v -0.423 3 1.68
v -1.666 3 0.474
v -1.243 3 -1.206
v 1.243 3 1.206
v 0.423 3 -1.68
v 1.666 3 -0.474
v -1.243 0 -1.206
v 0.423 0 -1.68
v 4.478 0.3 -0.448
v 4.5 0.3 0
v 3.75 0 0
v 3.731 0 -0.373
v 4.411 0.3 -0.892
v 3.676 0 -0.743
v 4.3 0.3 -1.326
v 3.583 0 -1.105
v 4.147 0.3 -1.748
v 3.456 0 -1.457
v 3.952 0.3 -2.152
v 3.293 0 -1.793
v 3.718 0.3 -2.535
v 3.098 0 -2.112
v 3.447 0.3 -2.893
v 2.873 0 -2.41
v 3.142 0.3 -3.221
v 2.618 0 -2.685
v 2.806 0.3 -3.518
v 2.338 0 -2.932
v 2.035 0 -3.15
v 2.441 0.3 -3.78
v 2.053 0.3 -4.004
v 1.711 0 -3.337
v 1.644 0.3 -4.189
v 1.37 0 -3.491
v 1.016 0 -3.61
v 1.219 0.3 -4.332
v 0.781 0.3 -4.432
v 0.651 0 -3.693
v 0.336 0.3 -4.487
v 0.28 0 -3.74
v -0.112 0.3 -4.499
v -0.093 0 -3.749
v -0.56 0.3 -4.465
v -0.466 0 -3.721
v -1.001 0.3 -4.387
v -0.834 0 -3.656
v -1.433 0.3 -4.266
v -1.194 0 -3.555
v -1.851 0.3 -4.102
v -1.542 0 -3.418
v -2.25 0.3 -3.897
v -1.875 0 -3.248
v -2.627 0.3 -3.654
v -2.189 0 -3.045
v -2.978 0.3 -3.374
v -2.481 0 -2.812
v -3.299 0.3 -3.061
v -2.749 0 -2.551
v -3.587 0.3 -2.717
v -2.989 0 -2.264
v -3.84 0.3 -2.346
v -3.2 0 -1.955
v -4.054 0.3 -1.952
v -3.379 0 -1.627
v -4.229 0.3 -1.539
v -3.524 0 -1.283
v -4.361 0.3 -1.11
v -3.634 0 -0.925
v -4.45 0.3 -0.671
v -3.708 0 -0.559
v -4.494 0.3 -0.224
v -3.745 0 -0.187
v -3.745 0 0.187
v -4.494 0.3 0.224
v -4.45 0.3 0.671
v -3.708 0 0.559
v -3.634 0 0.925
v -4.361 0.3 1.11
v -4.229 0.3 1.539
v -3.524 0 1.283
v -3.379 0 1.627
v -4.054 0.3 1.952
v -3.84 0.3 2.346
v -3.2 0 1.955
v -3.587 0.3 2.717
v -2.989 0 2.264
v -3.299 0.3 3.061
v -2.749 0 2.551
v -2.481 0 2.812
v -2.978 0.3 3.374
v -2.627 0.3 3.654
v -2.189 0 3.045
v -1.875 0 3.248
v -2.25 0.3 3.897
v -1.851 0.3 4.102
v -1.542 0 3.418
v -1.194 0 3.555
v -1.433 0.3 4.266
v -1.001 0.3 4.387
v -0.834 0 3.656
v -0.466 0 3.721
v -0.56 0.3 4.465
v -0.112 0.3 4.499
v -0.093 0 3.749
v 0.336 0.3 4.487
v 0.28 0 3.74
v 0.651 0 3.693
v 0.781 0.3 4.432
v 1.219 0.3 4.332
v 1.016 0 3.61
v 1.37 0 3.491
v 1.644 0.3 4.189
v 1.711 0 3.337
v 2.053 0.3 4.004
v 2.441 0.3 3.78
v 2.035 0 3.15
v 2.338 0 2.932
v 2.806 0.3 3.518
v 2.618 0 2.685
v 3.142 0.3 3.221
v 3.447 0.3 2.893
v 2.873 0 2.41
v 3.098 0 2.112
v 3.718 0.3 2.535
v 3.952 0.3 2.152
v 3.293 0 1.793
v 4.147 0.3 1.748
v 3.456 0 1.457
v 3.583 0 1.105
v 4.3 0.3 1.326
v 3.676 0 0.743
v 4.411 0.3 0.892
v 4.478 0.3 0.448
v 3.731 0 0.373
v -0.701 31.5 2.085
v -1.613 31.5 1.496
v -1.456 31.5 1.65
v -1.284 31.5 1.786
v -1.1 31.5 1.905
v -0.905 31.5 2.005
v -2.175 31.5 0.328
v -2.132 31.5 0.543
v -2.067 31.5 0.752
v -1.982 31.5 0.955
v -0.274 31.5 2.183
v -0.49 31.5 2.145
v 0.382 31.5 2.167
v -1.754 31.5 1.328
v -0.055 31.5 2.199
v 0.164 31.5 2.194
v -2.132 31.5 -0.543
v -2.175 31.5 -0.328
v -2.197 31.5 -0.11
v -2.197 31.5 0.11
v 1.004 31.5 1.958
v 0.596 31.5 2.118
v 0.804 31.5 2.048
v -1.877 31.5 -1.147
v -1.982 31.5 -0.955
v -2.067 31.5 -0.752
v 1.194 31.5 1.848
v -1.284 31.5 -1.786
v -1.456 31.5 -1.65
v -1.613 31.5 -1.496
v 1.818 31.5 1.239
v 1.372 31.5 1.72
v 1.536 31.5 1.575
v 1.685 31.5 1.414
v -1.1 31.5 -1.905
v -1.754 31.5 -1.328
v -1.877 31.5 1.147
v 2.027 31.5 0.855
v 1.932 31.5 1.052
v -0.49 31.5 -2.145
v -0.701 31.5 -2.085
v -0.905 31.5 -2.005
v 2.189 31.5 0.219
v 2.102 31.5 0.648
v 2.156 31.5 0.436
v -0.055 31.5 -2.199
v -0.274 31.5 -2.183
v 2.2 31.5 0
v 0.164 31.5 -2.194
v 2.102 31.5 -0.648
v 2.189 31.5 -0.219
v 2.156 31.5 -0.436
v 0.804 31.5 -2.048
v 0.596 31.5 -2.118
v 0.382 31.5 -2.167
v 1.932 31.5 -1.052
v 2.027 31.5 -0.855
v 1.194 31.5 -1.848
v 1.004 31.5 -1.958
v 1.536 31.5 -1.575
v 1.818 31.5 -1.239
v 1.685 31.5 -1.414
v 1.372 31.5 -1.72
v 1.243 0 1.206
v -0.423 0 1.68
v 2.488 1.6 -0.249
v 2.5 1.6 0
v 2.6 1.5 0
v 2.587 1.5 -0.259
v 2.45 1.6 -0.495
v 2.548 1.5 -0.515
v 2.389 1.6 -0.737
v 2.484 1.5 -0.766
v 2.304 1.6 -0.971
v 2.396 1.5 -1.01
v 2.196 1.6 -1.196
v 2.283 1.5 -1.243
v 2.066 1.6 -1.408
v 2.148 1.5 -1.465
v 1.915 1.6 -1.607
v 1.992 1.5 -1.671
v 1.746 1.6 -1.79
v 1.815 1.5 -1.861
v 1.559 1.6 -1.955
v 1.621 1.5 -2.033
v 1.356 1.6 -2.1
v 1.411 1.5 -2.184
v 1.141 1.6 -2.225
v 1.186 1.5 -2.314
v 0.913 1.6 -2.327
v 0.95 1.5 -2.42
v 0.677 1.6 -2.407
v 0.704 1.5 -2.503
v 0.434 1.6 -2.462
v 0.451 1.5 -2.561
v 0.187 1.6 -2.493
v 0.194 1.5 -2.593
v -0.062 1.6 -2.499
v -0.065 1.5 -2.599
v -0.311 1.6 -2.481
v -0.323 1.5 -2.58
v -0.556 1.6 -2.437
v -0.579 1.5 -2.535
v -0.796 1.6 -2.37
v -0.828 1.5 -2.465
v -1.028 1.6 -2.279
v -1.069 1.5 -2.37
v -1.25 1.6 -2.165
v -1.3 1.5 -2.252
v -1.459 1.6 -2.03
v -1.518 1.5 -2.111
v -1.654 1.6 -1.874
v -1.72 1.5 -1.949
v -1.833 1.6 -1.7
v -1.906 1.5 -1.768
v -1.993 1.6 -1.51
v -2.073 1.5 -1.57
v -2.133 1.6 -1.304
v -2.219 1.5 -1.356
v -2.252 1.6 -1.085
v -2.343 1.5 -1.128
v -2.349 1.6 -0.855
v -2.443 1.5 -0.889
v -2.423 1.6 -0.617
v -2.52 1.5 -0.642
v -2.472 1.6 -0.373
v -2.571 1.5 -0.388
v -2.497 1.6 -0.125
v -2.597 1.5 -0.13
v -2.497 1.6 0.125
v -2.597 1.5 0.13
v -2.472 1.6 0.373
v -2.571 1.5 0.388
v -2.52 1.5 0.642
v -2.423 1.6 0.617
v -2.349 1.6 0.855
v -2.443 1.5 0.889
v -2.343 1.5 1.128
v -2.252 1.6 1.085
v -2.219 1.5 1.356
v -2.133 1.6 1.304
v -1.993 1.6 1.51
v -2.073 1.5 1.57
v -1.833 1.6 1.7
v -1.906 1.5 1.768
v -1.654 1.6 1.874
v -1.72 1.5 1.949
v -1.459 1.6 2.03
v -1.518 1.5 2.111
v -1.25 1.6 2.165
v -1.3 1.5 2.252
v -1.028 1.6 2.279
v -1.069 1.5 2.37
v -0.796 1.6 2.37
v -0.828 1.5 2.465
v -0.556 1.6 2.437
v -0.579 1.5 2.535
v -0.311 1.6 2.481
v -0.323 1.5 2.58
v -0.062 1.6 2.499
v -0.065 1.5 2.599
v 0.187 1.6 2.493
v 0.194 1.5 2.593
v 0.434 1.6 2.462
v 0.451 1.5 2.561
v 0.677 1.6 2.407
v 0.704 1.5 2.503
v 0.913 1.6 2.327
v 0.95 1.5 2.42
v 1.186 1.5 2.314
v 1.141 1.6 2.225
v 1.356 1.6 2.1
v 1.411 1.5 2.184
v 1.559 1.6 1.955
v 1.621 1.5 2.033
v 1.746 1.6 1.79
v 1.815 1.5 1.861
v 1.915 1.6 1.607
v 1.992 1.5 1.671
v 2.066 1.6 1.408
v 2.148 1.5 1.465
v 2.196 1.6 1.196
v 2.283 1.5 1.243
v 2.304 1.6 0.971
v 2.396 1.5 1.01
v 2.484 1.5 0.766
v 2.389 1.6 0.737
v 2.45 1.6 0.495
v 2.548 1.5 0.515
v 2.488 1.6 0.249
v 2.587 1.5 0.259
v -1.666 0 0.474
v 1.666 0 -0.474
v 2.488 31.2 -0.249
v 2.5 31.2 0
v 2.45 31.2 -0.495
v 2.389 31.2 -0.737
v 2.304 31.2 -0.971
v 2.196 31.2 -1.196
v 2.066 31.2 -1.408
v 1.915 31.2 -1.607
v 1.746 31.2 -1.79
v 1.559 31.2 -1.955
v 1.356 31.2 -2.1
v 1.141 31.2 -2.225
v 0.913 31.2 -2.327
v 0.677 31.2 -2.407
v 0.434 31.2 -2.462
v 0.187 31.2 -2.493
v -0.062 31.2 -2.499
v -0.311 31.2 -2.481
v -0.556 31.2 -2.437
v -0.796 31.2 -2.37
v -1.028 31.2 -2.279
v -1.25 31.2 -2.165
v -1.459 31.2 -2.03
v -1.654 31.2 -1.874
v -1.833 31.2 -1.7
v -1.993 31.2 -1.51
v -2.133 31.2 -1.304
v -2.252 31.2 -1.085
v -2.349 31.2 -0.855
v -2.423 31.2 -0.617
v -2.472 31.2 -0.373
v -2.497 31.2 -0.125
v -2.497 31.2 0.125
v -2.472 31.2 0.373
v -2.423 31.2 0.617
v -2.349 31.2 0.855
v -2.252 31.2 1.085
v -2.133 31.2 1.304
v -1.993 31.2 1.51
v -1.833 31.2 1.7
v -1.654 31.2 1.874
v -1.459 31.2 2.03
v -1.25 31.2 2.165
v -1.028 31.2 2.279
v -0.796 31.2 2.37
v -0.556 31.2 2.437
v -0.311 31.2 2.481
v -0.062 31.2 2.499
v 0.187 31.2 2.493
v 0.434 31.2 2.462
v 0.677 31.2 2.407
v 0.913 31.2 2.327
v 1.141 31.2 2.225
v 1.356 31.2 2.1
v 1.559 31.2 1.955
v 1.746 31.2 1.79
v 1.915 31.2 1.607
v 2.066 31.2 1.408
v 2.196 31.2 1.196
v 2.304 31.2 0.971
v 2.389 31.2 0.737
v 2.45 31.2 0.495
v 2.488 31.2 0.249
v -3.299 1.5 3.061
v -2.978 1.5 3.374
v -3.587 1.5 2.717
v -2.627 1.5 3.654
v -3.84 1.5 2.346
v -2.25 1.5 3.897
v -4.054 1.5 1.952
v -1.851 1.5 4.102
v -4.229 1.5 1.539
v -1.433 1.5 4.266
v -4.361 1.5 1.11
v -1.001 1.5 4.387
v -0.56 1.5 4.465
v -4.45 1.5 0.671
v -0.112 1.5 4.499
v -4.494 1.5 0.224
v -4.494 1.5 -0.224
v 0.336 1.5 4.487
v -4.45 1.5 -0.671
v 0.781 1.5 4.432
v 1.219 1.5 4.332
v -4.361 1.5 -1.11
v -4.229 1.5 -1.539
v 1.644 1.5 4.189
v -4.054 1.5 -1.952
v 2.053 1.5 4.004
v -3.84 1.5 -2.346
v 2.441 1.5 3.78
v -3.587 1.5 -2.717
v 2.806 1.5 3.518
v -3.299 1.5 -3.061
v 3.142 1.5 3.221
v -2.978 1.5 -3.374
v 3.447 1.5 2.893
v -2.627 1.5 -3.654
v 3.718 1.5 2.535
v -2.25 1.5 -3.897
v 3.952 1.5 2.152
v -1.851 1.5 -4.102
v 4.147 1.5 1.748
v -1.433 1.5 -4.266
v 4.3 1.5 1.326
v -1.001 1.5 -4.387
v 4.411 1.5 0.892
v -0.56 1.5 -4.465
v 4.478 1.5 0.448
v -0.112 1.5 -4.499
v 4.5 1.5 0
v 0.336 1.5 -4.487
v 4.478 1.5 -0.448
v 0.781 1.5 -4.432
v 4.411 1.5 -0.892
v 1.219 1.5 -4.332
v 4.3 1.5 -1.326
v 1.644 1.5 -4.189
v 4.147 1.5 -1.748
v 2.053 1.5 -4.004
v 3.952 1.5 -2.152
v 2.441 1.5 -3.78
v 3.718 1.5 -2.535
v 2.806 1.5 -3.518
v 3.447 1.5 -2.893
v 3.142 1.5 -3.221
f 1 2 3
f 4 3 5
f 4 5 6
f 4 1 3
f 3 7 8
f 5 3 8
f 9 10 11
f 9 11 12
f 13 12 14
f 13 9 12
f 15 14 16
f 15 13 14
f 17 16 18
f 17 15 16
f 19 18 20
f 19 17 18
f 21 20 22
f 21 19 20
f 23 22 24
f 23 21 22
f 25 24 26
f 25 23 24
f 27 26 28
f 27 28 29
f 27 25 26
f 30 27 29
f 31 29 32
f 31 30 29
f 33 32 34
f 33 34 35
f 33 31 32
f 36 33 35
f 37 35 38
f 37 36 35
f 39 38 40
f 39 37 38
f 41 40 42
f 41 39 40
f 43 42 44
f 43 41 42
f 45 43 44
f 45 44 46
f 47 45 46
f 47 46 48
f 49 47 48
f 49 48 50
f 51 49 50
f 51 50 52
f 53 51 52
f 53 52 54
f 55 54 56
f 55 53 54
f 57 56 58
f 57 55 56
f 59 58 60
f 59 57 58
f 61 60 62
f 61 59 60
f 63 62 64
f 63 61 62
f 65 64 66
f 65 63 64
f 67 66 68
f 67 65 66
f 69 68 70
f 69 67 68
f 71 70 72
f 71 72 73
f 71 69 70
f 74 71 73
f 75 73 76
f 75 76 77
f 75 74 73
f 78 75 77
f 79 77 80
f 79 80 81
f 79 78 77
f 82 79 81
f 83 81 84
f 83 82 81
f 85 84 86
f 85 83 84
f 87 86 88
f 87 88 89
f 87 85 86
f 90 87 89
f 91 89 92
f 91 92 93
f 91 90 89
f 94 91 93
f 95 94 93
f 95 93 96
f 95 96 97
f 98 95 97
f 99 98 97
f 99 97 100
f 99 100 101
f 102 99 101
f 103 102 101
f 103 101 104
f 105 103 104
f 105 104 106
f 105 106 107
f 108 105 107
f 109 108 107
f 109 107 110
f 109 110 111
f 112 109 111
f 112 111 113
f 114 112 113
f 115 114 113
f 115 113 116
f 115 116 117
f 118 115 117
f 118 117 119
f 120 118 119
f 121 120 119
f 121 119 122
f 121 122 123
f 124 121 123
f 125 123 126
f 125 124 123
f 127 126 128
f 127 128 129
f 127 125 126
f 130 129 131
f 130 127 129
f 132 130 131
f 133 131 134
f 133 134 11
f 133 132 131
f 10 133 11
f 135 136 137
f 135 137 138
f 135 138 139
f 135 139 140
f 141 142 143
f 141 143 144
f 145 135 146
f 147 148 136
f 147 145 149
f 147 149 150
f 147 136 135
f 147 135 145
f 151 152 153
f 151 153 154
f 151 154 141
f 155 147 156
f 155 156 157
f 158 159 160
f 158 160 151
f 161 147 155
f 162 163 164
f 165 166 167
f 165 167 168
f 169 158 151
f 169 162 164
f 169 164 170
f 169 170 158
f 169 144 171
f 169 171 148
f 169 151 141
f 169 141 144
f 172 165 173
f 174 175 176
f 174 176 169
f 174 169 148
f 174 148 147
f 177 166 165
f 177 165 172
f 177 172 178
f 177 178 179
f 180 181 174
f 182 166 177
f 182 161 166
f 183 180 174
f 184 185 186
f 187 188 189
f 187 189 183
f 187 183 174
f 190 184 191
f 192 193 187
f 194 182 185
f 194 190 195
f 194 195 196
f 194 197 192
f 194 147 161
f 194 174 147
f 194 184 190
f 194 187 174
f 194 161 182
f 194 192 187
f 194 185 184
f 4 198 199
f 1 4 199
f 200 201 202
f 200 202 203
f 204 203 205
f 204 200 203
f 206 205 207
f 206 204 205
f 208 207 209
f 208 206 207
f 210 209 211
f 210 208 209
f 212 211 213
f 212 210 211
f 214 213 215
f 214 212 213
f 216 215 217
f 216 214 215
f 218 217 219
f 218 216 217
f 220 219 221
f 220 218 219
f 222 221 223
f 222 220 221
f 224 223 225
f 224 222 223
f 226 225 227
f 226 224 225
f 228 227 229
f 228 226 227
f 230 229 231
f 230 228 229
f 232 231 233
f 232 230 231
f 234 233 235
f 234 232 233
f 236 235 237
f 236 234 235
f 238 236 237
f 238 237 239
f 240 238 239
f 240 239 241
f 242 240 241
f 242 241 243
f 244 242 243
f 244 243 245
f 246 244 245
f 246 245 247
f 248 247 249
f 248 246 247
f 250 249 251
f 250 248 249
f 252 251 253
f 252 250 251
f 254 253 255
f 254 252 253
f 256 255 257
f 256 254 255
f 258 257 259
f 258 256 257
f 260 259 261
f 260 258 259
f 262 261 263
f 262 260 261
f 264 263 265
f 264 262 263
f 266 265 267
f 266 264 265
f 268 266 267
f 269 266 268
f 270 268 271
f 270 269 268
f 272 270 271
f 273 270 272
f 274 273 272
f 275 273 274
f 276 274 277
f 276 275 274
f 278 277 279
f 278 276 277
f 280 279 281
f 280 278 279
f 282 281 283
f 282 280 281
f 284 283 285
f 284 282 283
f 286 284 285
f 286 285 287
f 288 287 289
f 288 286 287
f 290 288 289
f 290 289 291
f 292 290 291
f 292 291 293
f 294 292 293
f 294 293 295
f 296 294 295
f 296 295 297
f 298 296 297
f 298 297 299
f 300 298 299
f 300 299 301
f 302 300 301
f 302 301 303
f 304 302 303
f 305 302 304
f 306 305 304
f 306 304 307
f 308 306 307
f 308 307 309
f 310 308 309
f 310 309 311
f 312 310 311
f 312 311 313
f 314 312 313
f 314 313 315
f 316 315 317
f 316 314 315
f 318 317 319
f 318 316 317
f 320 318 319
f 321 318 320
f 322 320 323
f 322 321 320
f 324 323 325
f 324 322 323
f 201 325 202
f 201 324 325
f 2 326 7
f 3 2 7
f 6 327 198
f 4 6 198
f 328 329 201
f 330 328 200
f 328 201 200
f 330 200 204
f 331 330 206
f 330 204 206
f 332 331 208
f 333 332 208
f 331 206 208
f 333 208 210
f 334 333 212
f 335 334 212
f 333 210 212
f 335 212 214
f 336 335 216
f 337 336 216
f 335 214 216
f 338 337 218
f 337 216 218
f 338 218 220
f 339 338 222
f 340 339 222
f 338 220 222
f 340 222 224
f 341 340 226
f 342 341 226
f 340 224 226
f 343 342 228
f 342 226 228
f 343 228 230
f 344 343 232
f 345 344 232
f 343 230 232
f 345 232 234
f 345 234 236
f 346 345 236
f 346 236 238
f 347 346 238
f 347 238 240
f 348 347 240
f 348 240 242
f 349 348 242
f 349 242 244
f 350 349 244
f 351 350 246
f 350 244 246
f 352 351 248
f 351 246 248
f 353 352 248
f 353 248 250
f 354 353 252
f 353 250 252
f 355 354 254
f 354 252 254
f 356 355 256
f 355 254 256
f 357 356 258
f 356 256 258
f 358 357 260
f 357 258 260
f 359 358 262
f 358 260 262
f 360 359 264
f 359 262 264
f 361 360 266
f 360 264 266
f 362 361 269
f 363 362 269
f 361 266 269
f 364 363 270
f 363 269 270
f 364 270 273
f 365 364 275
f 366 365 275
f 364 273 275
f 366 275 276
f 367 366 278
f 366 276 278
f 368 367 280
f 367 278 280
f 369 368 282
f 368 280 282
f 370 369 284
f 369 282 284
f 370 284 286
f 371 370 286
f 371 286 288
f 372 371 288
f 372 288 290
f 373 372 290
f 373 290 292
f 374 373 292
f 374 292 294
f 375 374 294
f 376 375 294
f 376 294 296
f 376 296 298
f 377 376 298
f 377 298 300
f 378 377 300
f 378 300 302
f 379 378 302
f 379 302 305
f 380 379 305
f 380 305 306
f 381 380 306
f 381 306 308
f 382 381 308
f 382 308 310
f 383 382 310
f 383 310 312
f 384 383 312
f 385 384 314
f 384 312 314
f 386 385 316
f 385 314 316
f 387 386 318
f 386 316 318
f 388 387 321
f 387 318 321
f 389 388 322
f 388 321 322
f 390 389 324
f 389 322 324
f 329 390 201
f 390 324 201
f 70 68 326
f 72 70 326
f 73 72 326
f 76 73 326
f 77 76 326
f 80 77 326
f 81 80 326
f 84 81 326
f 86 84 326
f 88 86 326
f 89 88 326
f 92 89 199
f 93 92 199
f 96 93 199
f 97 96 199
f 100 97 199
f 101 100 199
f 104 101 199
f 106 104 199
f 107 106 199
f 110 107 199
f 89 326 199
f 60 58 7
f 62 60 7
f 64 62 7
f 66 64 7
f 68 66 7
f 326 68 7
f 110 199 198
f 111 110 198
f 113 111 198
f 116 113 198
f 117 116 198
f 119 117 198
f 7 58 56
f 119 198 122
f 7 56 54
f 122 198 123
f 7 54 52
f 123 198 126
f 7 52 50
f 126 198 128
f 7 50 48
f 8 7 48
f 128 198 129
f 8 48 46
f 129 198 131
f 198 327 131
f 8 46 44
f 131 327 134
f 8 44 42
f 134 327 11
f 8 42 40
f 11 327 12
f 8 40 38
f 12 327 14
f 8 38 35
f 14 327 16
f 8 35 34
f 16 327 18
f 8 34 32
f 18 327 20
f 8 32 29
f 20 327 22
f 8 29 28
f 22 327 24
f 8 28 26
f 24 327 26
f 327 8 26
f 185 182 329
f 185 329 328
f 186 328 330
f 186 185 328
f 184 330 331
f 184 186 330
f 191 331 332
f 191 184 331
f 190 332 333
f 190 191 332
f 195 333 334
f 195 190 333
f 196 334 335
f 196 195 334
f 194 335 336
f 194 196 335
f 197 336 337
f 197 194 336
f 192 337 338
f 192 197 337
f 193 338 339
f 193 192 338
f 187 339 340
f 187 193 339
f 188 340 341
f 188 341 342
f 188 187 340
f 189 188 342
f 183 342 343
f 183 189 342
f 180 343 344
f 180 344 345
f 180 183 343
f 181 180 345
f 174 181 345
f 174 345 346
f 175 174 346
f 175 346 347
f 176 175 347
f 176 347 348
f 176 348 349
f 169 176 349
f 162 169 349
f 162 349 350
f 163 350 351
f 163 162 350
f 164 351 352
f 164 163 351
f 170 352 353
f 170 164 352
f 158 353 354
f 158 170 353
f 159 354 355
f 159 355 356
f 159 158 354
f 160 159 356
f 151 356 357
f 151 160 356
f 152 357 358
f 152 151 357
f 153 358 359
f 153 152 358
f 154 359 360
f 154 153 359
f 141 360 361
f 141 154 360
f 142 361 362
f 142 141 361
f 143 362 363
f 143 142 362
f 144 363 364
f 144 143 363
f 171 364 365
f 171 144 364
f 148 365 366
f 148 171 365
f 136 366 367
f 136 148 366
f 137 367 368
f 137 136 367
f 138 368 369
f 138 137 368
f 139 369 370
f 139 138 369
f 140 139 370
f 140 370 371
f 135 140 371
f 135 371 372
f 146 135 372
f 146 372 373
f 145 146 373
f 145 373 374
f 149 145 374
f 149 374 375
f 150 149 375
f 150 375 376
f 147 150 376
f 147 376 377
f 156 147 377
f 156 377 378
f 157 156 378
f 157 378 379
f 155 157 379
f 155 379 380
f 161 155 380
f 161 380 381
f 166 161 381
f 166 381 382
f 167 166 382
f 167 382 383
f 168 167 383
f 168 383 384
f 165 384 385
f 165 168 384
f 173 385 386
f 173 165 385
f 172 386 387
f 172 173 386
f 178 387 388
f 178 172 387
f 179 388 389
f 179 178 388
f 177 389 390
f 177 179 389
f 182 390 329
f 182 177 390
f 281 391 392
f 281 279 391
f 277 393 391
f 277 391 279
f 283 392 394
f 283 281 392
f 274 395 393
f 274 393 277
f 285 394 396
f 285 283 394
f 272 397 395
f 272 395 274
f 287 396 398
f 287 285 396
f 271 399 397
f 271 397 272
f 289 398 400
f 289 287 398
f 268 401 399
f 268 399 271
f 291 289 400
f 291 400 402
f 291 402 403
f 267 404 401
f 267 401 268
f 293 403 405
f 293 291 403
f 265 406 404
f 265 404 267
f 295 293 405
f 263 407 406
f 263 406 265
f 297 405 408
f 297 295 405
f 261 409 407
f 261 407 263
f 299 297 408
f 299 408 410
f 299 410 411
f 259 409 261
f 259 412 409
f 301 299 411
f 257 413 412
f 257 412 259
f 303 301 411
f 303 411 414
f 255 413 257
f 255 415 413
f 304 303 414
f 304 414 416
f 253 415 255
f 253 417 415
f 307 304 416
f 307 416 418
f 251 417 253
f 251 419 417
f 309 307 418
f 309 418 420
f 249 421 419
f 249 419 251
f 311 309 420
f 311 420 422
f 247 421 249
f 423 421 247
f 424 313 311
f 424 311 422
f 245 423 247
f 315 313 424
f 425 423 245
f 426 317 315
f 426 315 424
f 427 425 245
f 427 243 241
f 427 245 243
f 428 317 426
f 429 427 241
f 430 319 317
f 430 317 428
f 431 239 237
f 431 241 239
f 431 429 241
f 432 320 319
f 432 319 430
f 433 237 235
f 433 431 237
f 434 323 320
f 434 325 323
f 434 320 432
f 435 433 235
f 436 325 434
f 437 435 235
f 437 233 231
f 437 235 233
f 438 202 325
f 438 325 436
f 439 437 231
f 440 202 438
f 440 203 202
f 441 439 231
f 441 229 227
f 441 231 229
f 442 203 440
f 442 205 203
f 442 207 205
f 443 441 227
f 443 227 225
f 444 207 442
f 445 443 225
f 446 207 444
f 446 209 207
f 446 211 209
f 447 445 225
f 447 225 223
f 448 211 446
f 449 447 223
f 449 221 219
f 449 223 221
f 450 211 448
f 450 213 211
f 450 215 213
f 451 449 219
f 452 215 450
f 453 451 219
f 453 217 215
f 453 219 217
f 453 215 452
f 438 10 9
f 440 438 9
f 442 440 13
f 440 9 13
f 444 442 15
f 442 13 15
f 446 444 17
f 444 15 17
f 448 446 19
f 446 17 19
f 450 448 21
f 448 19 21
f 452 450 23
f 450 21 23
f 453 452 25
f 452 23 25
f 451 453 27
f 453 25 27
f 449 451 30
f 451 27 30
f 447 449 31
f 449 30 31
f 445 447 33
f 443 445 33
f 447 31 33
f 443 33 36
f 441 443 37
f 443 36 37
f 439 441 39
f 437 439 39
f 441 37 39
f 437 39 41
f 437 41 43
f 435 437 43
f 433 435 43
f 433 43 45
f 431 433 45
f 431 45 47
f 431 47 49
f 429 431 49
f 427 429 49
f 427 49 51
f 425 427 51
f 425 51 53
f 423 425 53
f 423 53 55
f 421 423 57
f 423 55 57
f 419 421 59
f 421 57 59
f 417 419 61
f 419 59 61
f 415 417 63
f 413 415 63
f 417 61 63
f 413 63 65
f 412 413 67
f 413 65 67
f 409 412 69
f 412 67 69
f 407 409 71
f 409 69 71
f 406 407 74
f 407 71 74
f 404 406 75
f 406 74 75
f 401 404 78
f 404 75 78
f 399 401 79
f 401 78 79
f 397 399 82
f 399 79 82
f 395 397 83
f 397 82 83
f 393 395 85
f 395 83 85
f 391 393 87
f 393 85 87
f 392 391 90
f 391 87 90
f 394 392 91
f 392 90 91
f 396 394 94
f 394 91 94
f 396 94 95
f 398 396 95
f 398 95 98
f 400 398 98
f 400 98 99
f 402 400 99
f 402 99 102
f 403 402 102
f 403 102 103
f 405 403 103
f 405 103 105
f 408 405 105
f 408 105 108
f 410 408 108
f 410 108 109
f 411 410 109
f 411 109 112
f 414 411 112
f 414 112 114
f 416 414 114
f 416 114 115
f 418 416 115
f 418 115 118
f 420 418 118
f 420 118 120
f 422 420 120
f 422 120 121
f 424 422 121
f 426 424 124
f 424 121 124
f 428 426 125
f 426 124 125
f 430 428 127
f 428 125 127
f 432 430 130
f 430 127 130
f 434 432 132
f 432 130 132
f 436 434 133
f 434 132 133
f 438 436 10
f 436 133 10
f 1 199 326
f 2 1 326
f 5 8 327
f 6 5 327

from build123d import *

# Parameters (mm, degrees)
SKETCH2_R           = 4.5
BOSS_EXTRUDE1_DEPTH = 1.5
SKETCH3_R           = 2.5
BOSS_EXTRUDE2_DEPTH = 30
CHAMFER1_SIZE       = 0.1
CHAMFER2_SIZE       = 0.75
CHAMFER2_SIZE2      = 0.3
CUT_EXTRUDE1_DEPTH  = 3
CHAMFER3_SIZE       = 0.3


with BuildPart() as part:
    # Sketch2 → Boss-Extrude1 (new body)
    with BuildSketch(Plane(origin=(0, 0, 0), x_dir=(1, 0, 0), z_dir=(0, 1, 0))):
        Circle(SKETCH2_R)
    extrude(amount=BOSS_EXTRUDE1_DEPTH)

    # Sketch3 → Boss-Extrude2 (add)
    with BuildSketch(Plane(origin=(0, 1.5, 0), x_dir=(1, 0, 0), z_dir=(0, 1, 0))):
        Circle(SKETCH3_R)
    extrude(amount=BOSS_EXTRUDE2_DEPTH)

    # Chamfer1
    chamfer1_edges = [part.edges().sort_by_distance(p)[0] for p in [
        (-2.5, 1.5, 0),
    ]]
    chamfer(chamfer1_edges, length=CHAMFER1_SIZE)

    # Chamfer2
    chamfer2_edges = [part.edges().sort_by_distance(p)[0] for p in [
        (-4.5, 0, 0),
    ]]
    chamfer2_side = [part.faces().sort_by_distance(p)[0] for p in [
        (0, 0, 0),
    ]]
    chamfer(chamfer2_edges, length=CHAMFER2_SIZE, length2=CHAMFER2_SIZE2, reference=chamfer2_side[0])

    # Sketch4 → Cut-Extrude1 (cut)
    with BuildSketch(Plane.XZ):
        Polygon((-0.422737578, 1.679670486), (-1.6660061, 0.473733761), (-1.243268521, -1.205936725), (0.422737578, -1.679670486), (1.6660061, -0.473733761), (1.243268521, 1.205936725), align=None)
    extrude(amount=-CUT_EXTRUDE1_DEPTH, mode=Mode.SUBTRACT)

    # Chamfer3
    chamfer3_edges = [part.edges().sort_by_distance(p)[0] for p in [
        (-2.5, 31.5, 0),
    ]]
    chamfer(chamfer3_edges, length=CHAMFER3_SIZE)


solid = part.part
